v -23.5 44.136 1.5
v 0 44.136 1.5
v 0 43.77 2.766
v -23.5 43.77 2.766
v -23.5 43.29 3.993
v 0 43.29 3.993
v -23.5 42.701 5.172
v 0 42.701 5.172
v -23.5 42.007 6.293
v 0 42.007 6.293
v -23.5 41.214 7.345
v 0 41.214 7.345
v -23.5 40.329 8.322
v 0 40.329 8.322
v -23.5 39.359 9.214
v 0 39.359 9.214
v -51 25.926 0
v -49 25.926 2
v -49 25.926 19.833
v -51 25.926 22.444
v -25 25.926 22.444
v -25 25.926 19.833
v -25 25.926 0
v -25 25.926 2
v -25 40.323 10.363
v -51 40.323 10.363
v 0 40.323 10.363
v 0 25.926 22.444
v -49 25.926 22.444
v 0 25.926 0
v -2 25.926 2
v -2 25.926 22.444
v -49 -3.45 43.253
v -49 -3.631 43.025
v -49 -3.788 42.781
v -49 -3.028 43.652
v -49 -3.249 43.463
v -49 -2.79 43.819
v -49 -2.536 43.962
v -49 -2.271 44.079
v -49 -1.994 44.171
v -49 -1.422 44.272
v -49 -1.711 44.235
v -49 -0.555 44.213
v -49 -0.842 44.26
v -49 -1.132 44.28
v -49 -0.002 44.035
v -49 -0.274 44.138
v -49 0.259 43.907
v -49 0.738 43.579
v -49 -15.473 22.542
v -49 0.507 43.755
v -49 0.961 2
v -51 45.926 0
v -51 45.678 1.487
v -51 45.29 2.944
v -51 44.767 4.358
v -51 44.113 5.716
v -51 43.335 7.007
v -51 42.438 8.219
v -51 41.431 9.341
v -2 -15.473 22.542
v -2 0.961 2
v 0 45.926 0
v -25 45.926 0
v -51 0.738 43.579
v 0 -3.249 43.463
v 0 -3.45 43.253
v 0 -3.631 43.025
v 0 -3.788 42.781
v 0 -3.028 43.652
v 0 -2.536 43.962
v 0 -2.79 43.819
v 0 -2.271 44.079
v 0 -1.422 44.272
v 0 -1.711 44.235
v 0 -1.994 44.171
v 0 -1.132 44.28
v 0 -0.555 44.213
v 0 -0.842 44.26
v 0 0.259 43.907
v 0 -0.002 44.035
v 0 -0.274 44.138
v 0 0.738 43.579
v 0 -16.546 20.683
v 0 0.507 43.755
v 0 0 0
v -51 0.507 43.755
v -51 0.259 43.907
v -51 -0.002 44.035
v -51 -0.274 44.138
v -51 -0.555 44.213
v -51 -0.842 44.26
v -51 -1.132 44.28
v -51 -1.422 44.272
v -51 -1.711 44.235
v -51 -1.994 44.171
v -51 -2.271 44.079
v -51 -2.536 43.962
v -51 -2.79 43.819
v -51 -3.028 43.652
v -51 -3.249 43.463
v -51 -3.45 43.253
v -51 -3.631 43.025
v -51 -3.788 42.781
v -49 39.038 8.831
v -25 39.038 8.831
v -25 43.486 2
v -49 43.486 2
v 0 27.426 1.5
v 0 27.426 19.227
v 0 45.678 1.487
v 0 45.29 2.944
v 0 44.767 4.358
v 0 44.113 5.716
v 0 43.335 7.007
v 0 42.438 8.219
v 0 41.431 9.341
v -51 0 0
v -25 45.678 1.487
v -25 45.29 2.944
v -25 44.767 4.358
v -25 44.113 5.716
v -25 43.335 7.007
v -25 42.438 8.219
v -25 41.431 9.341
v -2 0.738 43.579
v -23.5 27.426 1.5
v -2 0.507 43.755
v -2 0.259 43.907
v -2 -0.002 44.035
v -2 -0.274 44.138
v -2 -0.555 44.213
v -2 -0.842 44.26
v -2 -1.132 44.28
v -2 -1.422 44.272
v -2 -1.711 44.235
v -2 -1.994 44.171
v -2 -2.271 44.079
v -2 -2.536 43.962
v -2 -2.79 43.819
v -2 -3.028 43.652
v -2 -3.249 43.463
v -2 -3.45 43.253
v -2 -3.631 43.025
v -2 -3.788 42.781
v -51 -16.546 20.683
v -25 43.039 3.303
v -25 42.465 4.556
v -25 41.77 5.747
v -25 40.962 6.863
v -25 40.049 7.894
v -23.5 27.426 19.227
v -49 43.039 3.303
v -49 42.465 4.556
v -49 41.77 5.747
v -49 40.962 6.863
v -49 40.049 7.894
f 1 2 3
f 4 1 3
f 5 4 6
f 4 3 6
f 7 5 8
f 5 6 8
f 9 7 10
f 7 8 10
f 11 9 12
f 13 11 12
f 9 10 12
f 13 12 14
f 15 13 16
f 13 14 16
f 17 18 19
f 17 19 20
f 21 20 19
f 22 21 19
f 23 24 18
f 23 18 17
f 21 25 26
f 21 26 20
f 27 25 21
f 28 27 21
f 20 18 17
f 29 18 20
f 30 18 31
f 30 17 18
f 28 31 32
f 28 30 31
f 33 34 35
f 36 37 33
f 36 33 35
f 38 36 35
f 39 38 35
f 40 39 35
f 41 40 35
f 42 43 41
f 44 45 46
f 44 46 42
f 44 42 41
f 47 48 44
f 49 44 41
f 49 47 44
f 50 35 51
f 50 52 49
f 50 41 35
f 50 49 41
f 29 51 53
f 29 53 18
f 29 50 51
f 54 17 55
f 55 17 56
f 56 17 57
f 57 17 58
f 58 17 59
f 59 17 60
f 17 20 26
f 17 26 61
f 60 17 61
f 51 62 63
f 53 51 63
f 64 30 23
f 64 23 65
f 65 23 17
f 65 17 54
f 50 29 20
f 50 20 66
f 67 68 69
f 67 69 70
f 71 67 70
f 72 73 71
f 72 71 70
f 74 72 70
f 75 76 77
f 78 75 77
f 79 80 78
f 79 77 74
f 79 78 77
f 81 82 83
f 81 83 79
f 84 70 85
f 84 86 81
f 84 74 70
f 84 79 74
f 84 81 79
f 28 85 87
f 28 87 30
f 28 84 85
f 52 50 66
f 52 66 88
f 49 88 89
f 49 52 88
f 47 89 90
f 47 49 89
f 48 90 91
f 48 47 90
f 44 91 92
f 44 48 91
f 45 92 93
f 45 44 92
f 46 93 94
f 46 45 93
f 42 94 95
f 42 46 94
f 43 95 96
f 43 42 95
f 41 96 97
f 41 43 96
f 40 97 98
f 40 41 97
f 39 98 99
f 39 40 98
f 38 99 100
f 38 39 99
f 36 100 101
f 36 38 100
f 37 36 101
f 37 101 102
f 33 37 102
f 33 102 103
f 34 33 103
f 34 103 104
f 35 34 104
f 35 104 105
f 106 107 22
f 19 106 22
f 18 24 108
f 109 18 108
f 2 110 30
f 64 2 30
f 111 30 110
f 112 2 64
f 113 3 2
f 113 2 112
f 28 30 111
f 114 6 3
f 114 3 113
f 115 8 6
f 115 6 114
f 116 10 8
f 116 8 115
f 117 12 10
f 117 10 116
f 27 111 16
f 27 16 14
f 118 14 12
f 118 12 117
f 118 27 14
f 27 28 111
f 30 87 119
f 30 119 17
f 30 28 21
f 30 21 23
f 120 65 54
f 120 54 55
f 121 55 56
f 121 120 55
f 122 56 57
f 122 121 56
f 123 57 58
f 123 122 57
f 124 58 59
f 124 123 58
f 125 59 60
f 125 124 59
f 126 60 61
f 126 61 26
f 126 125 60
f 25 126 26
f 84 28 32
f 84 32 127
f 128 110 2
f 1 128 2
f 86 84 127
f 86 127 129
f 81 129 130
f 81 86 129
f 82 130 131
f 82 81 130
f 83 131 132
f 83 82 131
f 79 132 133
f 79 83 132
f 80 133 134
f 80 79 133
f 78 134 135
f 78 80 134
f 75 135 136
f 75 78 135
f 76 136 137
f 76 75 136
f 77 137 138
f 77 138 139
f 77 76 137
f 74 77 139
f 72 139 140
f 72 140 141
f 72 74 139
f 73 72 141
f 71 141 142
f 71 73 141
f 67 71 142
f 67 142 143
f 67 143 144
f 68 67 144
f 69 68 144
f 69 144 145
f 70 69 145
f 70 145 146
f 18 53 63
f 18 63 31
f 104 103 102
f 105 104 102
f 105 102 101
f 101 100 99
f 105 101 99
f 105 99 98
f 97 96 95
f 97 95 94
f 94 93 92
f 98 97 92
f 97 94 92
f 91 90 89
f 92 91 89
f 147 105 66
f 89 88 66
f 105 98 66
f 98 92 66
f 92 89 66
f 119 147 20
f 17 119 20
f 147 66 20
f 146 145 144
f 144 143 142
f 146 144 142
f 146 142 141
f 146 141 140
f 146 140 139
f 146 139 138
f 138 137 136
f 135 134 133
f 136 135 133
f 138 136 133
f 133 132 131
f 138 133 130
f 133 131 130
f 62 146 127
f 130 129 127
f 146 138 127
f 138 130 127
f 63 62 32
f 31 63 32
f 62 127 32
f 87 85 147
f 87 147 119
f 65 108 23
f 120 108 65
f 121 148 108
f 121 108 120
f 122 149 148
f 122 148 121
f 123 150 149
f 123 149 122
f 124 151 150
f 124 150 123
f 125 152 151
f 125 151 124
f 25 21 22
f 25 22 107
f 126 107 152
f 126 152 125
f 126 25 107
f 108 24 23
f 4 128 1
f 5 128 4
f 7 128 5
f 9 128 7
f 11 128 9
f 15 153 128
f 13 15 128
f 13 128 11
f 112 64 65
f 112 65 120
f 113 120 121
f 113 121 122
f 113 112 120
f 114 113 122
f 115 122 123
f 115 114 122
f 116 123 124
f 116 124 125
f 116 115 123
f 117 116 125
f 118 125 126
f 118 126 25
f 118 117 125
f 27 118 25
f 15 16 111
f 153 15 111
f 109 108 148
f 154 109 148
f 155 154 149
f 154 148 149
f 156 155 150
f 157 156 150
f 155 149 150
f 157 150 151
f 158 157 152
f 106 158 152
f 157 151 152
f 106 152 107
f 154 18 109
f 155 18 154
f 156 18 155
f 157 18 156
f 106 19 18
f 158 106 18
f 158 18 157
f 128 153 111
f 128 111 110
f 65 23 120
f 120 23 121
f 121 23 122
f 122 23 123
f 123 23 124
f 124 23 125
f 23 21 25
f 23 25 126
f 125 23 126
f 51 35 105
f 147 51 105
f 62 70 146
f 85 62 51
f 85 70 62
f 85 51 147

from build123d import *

# Parameters (mm, degrees)
F1_DEPTH = 51
F2_DEPTH = 51
F3_T     = -2
F4_DEPTH = 25
F5_DEPTH = 25
F6_T     = -2
F7_T     = -1.5


with BuildPart() as f1:
    # F0 (on Right) → F1 (new body)
    with BuildSketch(Plane.YZ):
        with BuildLine():
            Line((-3.7880441666, 42.7807628889), (-16.5462800706, 20.6828500882))
            Line((-16.5462800706, 20.6828500882), (0, 0))
            Line((0, 0), (25.926308784, 0))
            Line((25.926308784, 0), (25.926308784, 22.4437269461))
            Line((25.926308784, 22.4437269461), (0.7383948738, 43.5788962182))
            ThreePointArc((0.7383948738, 43.5788962182), (-1.7109124882, 44.2351861479), (-3.7880441666, 42.7807628889))
        make_face()
    extrude(amount=-F1_DEPTH)

    # F3
    f3_openings = [f1.faces().sort_by_distance(p)[0] for p in [
        (-25.5, 13.332352, 33.011312),
        (-25.5, -10.167162, 31.731806),
        (-25.5, -1.710912, 44.235186),
        (-25.5, 25.926309, 11.221863),
    ]]
    offset(amount=F3_T, openings=f3_openings)


with BuildPart() as f2:
    # F0 (on Right) → F2 (new body)
    with BuildSketch(Plane.YZ):
        with BuildLine():
            Line((25.926308784, 22.4437269461), (25.926308784, 0))
            Line((25.926308784, 0), (45.926308784, 0))
            ThreePointArc((45.926308784, 0), (44.1133491535, 5.7160394907), (40.32335206, 10.3631732431))
            Line((40.32335206, 10.3631732431), (25.926308784, 22.4437269461))
        make_face()
    extrude(amount=-F2_DEPTH)

    # F0 (on Right) → F4 (cut)
    with BuildSketch(Plane.YZ):
        with BuildLine():
            Line((25.926308784, 22.4437269461), (25.926308784, 0))
            Line((25.926308784, 0), (45.926308784, 0))
            ThreePointArc((45.926308784, 0), (44.1133491535, 5.7160394907), (40.32335206, 10.3631732431))
            Line((40.32335206, 10.3631732431), (25.926308784, 22.4437269461))
        make_face()
    extrude(amount=-F4_DEPTH, mode=Mode.SUBTRACT)

    # F6
    f6_openings = [f2.faces().sort_by_distance(p)[0] for p in [
        (-38, 25.926309, 11.221863),
        (-25, 33.661047, 7.927277),
    ]]
    offset(amount=F6_T, openings=f6_openings)


with BuildPart() as f5:
    # F0 (on Right) → F5 (new body)
    with BuildSketch(Plane.YZ):
        with BuildLine():
            Line((25.926308784, 22.4437269461), (25.926308784, 0))
            Line((25.926308784, 0), (45.926308784, 0))
            ThreePointArc((45.926308784, 0), (44.1133491535, 5.7160394907), (40.32335206, 10.3631732431))
            Line((40.32335206, 10.3631732431), (25.926308784, 22.4437269461))
        make_face()
    extrude(amount=-F5_DEPTH)

    # F7
    f7_openings = [f5.faces().sort_by_distance(p)[0] for p in [
        (0, 33.661047, 7.927277),
    ]]
    offset(amount=F7_T, openings=f7_openings)


solid = Compound([f1.part, f2.part, f5.part])
